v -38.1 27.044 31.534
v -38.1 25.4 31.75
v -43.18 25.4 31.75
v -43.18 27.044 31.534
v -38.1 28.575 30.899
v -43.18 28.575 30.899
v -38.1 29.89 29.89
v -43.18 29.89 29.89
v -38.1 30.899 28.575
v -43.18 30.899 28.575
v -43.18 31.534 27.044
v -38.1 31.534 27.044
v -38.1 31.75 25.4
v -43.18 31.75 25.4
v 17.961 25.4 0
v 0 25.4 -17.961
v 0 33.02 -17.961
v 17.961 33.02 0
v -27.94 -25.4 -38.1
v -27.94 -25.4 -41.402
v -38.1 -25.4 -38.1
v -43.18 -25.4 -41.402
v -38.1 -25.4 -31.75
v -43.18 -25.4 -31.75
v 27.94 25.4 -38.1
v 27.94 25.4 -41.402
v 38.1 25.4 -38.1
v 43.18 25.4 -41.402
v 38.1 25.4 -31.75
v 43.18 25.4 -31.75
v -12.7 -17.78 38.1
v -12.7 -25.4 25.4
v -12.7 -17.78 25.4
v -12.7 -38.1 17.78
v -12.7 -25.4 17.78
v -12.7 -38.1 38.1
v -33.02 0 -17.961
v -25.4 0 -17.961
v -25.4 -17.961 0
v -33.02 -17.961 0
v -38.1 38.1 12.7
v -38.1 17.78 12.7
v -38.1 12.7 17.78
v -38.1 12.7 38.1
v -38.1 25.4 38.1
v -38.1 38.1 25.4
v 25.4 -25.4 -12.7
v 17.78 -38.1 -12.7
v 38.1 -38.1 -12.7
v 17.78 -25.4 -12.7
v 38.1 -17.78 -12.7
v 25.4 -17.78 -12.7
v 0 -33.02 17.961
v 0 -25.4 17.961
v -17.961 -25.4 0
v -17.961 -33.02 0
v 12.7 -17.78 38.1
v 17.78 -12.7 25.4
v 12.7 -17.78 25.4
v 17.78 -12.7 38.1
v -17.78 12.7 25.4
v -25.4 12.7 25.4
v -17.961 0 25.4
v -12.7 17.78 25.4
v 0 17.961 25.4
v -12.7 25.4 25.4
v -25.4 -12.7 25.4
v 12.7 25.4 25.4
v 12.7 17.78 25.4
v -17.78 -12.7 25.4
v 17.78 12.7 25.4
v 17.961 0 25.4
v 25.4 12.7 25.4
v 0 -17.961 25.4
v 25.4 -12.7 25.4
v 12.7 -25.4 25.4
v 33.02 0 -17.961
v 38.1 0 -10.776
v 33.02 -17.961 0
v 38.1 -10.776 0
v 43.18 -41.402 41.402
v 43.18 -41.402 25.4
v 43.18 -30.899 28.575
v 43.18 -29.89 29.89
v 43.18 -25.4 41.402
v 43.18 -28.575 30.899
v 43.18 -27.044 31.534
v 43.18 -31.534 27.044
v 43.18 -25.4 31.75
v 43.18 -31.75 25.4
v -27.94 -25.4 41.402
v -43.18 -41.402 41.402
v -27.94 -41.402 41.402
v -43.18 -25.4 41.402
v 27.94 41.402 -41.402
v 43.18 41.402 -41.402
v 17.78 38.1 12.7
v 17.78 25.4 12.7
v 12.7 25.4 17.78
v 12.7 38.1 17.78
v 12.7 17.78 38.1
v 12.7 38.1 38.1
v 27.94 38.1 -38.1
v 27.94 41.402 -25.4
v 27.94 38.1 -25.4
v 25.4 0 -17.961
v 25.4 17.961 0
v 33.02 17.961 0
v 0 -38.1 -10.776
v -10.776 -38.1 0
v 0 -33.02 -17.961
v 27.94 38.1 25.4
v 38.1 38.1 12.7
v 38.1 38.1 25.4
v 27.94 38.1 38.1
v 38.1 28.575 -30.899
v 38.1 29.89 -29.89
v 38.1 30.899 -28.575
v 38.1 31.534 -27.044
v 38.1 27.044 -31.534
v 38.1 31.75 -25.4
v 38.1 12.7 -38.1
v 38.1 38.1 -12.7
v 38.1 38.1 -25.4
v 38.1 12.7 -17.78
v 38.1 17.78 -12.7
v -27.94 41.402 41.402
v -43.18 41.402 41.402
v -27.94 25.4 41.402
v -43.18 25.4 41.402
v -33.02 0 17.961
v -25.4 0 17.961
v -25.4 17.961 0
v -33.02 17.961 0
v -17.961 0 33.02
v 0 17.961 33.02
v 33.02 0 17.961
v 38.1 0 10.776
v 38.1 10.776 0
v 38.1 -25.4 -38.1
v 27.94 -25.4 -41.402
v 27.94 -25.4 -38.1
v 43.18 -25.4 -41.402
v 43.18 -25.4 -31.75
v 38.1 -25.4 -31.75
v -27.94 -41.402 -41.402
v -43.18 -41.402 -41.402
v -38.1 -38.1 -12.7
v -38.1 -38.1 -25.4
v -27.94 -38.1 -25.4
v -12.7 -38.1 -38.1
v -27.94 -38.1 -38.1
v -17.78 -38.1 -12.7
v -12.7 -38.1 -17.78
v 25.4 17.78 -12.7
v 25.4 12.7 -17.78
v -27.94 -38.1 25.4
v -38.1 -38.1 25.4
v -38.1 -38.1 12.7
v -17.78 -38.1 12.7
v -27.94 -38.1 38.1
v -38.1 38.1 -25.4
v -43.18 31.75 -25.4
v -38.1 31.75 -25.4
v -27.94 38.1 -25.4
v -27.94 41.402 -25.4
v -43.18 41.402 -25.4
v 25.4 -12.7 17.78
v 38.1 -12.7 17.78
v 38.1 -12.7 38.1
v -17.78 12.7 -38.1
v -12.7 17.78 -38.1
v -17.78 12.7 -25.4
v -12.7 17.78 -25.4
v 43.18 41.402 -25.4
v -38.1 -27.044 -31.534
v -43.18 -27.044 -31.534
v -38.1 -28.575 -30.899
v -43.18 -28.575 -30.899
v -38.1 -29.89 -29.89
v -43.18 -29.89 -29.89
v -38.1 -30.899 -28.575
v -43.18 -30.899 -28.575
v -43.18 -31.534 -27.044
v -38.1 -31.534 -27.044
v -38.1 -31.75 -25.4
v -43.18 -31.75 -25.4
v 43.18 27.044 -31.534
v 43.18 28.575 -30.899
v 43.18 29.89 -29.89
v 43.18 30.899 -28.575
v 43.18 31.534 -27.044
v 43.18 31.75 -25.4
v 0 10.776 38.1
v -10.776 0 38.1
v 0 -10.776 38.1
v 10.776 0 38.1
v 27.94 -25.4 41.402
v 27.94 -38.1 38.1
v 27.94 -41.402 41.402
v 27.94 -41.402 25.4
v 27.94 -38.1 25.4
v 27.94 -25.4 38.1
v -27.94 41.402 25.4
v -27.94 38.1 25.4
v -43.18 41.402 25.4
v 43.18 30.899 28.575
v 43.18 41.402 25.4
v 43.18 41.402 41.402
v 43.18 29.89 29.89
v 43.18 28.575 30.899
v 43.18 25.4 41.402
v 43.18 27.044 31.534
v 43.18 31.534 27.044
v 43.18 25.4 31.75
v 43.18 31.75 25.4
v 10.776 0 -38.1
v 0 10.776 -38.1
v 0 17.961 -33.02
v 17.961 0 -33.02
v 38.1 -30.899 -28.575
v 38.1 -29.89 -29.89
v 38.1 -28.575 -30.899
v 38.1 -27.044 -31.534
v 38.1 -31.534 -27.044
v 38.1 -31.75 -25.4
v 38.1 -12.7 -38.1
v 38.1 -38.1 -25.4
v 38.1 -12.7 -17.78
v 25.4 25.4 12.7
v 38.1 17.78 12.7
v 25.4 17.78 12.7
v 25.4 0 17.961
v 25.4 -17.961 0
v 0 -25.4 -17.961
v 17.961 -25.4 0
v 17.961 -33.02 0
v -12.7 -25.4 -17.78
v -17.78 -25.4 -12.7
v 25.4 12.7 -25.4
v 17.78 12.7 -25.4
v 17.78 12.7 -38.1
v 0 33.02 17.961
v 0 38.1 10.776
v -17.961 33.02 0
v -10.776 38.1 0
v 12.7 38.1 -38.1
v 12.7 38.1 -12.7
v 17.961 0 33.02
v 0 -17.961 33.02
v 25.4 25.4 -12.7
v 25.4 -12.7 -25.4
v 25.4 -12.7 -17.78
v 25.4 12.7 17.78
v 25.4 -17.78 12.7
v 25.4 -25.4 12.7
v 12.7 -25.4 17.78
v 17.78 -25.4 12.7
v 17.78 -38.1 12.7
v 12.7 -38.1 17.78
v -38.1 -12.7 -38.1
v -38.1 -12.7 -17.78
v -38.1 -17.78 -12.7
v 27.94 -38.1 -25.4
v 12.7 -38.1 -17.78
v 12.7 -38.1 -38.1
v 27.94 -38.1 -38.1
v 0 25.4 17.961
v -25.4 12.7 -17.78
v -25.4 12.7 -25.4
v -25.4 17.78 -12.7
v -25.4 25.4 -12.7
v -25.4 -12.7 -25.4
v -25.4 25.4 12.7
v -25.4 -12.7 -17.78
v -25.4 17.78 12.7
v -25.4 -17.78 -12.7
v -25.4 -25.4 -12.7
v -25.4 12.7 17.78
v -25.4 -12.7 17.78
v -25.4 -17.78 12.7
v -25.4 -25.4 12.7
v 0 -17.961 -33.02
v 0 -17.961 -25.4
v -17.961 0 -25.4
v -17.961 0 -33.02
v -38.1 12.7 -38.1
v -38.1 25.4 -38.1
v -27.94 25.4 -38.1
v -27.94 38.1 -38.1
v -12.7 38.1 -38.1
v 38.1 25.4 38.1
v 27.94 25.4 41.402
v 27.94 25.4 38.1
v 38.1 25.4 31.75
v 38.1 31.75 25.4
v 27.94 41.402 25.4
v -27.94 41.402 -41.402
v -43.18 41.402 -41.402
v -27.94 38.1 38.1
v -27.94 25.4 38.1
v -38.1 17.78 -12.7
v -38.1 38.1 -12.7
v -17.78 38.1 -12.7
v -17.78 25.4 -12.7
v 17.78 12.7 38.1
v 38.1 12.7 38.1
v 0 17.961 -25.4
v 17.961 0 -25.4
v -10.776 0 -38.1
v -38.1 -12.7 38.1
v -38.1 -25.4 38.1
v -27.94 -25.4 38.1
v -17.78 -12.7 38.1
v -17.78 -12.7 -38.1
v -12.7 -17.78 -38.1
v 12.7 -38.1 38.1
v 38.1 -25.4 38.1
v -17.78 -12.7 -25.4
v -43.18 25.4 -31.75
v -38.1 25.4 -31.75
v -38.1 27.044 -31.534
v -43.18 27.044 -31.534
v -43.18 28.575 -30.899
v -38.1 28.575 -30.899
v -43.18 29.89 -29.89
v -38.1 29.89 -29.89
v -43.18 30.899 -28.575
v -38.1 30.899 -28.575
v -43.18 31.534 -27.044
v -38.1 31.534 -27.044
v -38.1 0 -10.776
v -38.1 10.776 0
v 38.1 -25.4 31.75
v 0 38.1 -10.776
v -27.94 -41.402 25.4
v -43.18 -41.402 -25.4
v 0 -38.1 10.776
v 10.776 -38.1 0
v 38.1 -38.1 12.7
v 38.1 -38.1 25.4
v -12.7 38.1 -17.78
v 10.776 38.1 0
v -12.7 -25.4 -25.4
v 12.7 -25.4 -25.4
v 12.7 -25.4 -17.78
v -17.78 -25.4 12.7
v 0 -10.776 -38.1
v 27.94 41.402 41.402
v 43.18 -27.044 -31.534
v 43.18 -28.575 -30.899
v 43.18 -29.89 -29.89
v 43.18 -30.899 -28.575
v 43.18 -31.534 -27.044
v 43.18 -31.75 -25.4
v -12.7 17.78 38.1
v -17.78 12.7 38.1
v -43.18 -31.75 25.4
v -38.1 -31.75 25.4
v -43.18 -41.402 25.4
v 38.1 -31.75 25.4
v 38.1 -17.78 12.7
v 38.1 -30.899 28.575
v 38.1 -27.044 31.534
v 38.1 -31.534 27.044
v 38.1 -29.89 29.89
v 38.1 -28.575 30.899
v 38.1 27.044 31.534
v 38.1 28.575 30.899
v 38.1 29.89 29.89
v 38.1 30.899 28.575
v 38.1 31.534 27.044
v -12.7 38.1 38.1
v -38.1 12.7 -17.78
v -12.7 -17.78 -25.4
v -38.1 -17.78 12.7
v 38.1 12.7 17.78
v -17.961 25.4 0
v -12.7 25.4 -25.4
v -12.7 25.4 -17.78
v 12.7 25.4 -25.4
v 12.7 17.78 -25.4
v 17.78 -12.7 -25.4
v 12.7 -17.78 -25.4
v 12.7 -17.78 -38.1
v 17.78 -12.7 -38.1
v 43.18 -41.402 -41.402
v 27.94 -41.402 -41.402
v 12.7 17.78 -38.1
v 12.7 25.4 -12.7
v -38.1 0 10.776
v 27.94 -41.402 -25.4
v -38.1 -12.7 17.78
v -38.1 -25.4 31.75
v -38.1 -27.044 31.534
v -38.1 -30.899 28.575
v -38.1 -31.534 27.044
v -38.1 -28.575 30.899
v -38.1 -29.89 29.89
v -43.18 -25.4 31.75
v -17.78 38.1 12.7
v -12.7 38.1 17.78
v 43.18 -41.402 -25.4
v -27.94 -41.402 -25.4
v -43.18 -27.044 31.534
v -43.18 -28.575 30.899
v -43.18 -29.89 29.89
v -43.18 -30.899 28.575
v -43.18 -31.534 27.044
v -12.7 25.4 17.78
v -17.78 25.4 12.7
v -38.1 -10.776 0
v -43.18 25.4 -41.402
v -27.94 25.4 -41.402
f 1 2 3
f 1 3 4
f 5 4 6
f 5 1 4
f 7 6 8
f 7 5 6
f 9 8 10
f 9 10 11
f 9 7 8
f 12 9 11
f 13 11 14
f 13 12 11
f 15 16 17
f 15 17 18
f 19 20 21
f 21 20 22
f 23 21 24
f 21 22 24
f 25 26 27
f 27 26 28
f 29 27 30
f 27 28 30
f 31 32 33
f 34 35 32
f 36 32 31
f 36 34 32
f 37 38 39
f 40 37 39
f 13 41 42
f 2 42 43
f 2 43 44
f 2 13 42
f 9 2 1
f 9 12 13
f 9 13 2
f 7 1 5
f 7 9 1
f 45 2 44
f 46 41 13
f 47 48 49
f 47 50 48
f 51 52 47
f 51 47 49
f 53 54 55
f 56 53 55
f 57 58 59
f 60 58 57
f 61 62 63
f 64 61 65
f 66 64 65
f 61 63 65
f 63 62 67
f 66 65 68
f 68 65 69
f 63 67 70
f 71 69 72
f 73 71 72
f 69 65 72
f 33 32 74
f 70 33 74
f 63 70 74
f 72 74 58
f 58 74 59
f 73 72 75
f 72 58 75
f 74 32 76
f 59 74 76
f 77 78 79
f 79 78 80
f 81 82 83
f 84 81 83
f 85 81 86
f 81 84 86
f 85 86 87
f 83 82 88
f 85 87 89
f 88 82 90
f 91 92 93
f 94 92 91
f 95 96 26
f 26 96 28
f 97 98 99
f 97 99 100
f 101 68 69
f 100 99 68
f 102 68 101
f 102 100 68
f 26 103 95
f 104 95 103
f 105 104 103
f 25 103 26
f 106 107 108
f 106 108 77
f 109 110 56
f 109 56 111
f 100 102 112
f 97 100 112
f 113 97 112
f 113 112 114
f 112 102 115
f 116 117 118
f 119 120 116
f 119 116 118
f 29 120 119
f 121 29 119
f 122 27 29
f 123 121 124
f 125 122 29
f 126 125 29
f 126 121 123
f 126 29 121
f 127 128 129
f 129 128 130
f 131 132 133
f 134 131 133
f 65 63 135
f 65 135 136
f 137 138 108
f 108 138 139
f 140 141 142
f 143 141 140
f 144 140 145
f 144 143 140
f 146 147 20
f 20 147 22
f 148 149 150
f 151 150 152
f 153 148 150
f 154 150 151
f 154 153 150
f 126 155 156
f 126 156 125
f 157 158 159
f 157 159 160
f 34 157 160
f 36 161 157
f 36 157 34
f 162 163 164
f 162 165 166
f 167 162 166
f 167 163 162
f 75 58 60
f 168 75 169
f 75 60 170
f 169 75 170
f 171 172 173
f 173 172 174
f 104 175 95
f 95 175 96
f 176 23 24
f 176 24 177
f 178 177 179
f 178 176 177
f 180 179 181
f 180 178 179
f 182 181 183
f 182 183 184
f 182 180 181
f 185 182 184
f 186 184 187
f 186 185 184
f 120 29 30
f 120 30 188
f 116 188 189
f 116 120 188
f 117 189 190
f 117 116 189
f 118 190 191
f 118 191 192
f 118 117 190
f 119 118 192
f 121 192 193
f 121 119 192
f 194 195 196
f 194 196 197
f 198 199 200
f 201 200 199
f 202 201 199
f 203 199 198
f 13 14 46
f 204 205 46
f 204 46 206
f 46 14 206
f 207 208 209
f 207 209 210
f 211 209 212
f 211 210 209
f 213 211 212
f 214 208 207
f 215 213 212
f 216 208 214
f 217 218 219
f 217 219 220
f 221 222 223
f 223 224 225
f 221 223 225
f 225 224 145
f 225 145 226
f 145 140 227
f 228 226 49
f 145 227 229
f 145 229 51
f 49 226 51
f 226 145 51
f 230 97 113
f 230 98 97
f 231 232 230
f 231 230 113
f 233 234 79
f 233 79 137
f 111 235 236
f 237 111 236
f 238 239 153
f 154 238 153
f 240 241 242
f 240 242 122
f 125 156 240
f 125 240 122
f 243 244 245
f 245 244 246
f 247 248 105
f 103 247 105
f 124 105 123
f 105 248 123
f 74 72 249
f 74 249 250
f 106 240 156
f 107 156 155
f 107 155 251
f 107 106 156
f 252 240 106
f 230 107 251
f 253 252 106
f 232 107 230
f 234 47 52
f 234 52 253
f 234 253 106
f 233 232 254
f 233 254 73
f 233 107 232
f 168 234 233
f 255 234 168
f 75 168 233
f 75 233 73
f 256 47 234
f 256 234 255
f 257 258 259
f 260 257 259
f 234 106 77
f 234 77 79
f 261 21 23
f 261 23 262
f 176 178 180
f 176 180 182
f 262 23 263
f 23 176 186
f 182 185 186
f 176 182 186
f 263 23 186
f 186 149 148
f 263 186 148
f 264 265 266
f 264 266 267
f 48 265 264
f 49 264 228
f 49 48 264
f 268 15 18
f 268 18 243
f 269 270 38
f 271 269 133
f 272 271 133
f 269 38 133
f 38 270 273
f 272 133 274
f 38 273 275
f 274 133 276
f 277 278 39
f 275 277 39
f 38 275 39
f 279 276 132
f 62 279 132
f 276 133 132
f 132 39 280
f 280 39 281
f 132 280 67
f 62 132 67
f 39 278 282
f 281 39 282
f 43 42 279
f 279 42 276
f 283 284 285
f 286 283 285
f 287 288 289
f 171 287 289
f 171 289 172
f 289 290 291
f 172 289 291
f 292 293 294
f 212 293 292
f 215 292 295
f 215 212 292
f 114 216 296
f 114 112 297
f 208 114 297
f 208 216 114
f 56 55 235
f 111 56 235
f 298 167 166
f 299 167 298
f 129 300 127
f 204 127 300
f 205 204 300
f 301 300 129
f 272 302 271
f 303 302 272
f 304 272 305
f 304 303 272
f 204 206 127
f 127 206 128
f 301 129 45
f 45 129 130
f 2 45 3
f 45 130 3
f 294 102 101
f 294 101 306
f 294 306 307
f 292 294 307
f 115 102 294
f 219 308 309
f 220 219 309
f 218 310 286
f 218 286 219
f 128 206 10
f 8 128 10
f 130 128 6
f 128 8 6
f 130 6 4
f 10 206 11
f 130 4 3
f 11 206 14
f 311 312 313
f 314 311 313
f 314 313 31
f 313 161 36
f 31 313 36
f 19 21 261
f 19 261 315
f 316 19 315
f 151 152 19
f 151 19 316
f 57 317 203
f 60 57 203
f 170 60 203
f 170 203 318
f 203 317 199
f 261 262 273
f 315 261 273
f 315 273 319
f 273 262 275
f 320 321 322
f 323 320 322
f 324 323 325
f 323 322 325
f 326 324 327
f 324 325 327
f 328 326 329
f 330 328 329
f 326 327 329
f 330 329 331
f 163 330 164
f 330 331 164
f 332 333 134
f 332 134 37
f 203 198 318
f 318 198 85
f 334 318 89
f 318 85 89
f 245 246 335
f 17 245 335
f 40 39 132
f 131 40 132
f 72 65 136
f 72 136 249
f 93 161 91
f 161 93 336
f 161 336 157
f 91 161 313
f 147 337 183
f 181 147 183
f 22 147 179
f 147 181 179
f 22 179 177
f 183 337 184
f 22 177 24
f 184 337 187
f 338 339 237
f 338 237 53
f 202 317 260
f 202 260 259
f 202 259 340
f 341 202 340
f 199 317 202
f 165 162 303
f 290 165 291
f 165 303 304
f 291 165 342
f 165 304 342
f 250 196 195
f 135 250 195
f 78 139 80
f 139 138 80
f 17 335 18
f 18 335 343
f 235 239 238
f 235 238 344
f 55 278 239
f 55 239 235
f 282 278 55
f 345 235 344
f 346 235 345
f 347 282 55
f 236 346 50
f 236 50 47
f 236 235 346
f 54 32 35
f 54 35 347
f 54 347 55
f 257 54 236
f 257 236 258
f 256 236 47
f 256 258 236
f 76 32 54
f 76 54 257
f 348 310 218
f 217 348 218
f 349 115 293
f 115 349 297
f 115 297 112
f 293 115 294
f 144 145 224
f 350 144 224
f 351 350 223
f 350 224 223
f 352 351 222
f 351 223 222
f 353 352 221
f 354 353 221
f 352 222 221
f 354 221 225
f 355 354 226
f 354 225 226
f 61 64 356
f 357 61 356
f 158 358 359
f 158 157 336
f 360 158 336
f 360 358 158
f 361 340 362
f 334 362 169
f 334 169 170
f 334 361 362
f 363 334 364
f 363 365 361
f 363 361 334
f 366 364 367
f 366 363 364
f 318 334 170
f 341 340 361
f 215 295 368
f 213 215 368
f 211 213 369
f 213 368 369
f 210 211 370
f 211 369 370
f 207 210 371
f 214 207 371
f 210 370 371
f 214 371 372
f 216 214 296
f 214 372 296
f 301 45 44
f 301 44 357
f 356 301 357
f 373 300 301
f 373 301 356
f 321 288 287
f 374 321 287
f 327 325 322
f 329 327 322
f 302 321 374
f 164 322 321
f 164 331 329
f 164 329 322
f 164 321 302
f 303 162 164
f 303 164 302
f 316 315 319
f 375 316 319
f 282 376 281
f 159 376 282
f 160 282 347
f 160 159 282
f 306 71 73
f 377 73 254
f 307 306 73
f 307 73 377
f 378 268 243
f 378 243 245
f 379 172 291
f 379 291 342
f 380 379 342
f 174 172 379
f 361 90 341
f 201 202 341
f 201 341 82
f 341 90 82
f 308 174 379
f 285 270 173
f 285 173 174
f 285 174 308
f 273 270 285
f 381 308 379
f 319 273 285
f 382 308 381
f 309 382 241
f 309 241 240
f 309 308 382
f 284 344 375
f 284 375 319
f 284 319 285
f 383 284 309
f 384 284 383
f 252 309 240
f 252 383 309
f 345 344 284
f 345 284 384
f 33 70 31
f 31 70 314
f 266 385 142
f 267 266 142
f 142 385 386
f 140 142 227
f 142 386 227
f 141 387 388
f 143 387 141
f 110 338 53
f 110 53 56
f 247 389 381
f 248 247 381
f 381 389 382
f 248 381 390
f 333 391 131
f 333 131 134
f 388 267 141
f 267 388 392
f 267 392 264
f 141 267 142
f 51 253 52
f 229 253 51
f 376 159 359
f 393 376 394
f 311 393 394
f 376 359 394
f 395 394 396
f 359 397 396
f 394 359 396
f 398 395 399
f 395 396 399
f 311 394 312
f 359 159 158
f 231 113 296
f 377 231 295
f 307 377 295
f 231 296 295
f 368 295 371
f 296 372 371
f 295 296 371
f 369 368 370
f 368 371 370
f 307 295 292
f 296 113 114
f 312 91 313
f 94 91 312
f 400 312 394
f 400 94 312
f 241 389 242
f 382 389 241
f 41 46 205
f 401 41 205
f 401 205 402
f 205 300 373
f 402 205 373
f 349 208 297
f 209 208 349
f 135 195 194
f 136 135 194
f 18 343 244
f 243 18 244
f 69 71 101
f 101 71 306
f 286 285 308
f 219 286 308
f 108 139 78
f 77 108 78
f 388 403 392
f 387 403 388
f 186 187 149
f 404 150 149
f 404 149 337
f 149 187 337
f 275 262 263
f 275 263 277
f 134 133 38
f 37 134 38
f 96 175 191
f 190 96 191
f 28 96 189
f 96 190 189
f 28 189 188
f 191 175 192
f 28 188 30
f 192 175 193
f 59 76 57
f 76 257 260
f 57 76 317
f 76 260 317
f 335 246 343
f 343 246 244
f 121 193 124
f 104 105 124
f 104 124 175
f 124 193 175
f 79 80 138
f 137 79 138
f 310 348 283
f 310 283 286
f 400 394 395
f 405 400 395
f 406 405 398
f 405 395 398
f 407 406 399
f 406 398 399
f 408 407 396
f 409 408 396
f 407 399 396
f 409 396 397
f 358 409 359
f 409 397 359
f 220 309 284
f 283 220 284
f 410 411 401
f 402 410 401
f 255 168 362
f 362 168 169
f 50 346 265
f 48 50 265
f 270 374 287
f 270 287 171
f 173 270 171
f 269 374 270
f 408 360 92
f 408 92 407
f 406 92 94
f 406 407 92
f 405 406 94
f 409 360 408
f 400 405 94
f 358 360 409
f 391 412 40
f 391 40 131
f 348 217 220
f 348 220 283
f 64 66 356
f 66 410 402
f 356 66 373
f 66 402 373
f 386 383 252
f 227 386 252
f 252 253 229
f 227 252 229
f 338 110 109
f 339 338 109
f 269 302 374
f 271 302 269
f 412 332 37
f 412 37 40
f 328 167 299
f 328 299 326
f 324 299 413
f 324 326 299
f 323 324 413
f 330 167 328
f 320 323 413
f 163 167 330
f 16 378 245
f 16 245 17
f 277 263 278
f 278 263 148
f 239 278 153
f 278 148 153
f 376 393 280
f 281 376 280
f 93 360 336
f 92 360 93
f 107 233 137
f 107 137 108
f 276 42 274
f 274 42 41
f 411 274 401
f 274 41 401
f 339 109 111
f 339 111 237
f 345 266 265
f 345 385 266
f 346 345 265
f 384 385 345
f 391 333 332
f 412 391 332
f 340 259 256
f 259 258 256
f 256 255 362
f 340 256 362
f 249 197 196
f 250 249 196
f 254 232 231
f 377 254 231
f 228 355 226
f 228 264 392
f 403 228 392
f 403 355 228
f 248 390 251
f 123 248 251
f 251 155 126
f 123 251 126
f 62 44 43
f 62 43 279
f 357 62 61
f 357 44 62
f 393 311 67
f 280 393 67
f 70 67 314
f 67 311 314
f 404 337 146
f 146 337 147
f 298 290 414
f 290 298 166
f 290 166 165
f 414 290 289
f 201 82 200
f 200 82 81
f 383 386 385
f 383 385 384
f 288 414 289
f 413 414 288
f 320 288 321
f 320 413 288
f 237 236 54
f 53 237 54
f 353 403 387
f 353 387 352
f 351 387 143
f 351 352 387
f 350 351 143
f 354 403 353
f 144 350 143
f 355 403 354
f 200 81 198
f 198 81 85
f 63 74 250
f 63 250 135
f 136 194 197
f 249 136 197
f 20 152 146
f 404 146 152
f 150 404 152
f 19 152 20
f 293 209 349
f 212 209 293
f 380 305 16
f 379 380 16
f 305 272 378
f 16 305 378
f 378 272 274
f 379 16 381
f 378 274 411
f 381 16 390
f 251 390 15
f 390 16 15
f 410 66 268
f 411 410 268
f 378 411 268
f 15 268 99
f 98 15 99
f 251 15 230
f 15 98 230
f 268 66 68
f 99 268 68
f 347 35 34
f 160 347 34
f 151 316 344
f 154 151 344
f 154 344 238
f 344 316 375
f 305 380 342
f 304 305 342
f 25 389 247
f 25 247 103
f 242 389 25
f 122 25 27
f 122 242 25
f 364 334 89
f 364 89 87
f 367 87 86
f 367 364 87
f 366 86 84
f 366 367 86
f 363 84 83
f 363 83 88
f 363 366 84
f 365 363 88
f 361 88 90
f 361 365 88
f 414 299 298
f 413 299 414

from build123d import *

# Parameters (mm, degrees)
F0_W           = 50.8
F0_H           = 50.8
F1_DEPTH       = 25.4
F1_DEPTH_BACK  = 25.4
F2_W           = 25.4
F2_H           = 25.4
F3_DEPTH       = 12.7
F3_DEPTH_BACK  = 12.7
F6_DEPTH       = 12.7
F6_DEPTH_BACK  = 12.7
F9_DEPTH       = 12.7
F9_DEPTH_BACK  = 12.7
F11_DEPTH      = 5.08
F11_DEPTH_BACK = 10.16
F16_SIZE       = 5.08
F17_SIZE       = 5.08


with BuildPart() as f1:
    # F0 (on Front) → F1 (new body, two sides)
    with BuildSketch(Plane.XZ) as f1_sk:
        Rectangle(F0_W, F0_H)
    extrude(amount=F1_DEPTH)
    extrude(f1_sk.sketch, amount=-F1_DEPTH_BACK)

    # F2 (on face) → F3 (join, two sides)
    with BuildSketch(Plane.XZ.offset(25.4)) as f3_sk:
        with Locations((-25.4, 25.4)):
            Rectangle(F2_W, F2_H)
        with Locations((25.4, 25.4)):
            Rectangle(F2_W, F2_H)
        with Locations((25.4, -25.4)):
            Rectangle(F2_W, F2_H)
        with Locations((-25.4, -25.4)):
            Rectangle(F2_W, F2_H)
        Polygon((17.9605122421, 0), (0, 17.9605122421), (-17.9605122421, 0), (0, -17.9605122421), align=None)
    extrude(amount=F3_DEPTH)
    extrude(f3_sk.sketch, amount=-F3_DEPTH_BACK)

    # F4: F1 across plane


with BuildPart() as f1_1:
    add(f1.part)
    add(f1.part.mirror(Plane.XZ))

    # F5 (on face) → F6 (join, two sides)
    with BuildSketch(Plane(origin=(0, 0, -25.4), x_dir=(1, 0, 0), z_dir=(0, 0, -1))) as f6_sk:
        Polygon((17.9605122421, 0), (0, 17.9605122421), (-17.9605122421, 0), (0, -17.9605122421), align=None)
    extrude(amount=F6_DEPTH)
    extrude(f6_sk.sketch, amount=-F6_DEPTH_BACK)

    # F7: F1 across plane


with BuildPart() as f1_2:
    add(f1_1.part)
    add(f1_1.part.mirror(Plane.XY))

    # F8 (on face) → F9 (join, two sides)
    with BuildSketch(Plane(origin=(-25.4, 0, 0), x_dir=(0, -1, 0), z_dir=(-1, 0, 0))) as f9_sk:
        Polygon((17.9605122421, 0), (0, 17.9605122421), (-17.9605122421, 0), (0, -17.9605122421), align=None)
    extrude(amount=F9_DEPTH)
    extrude(f9_sk.sketch, amount=-F9_DEPTH_BACK)

    # F10 (on face) → F11 (join, two sides)
    with BuildSketch(Plane(origin=(-38.1, 0, 0), x_dir=(0, -1, 0), z_dir=(-1, 0, 0))) as f11_sk:
        Polygon((-38.1, -38.1), (-38.1, -25.4), (-41.402, -25.4), (-41.402, -38.1), (-41.402, -41.402), (-38.1, -41.402), (-25.4, -41.402), (-25.4, -38.1), align=None)
        with BuildLine():
            Line((-31.75, -25.4), (-38.1, -25.4))
            Line((-38.1, -25.4), (-38.1, -38.1))
            Line((-38.1, -38.1), (-25.4, -38.1))
            Line((-25.4, -38.1), (-25.4, -31.75))
            ThreePointArc((-25.4, -31.75), (-29.8901280605, -29.8901280605), (-31.75, -25.4))
        make_face()
    extrude(amount=F11_DEPTH)
    extrude(f11_sk.sketch, amount=-F11_DEPTH_BACK)

    # F12: F1 across plane


with BuildPart() as f1_3:
    add(f1_2.part)
    add(f1_2.part.mirror(Plane.YZ))

    # F13: F1 across plane


with BuildPart() as f1_4:
    add(f1_3.part)
    add(f1_3.part.mirror(Plane.XY))

    # F14: F1 across plane


with BuildPart() as f1_5:
    add(f1_4.part)
    add(f1_4.part.mirror(Plane.XZ))

    # F15: F1 across plane


with BuildPart() as f1_6:
    add(f1_5.part)
    add(f1_5.part.mirror(Plane.YZ), mode=Mode.INTERSECT)

    # F16
    f16_edges = [f1_6.edges().sort_by_distance(p)[0] for p in [
        (12.7, 12.7, -31.75),
        (12.7, -12.7, -31.75),
        (-12.7, -12.7, -31.75),
        (-12.7, 12.7, -31.75),
        (-12.7, 31.75, -12.7),
        (12.7, 31.75, 12.7),
        (-12.7, 31.75, 12.7),
        (31.75, 12.7, 12.7),
        (31.75, -12.7, 12.7),
        (31.75, -12.7, -12.7),
        (31.75, 12.7, -12.7),
        (-12.7, -12.7, 31.75),
        (-12.7, 12.7, 31.75),
        (12.7, -31.75, 12.7),
        (-12.7, -31.75, -12.7),
        (12.7, -31.75, -12.7),
        (12.7, 12.7, 31.75),
        (12.7, -12.7, 31.75),
        (-31.75, 12.7, -12.7),
        (-31.75, 12.7, 12.7),
        (-31.75, -12.7, -12.7),
        (-31.75, -12.7, 12.7),
        (-12.7, -31.75, 12.7),
    ]]
    chamfer(f16_edges, length=F16_SIZE)

    # F17
    f17_edges = [f1_6.edges().sort_by_distance(p)[0] for p in [
        (-38.1, 8.980256, -8.980256),
        (-38.1, -8.980256, -8.980256),
        (-38.1, -8.980256, 8.980256),
        (-38.1, 8.980256, 8.980256),
        (8.980256, -8.980256, -38.1),
        (-8.980256, -8.980256, -38.1),
        (-8.980256, 8.980256, -38.1),
        (8.980256, 8.980256, -38.1),
        (8.980256, 38.1, 8.980256),
        (-8.980256, 38.1, 8.980256),
        (-8.980256, 38.1, -8.980256),
        (8.980256, 38.1, -8.980256),
        (8.980256, -8.980256, 38.1),
        (-8.980256, -8.980256, 38.1),
        (-8.980256, 8.980256, 38.1),
        (8.980256, 8.980256, 38.1),
        (38.1, 8.980256, -8.980256),
        (38.1, -8.980256, -8.980256),
        (38.1, -8.980256, 8.980256),
        (38.1, 8.980256, 8.980256),
        (8.980256, -38.1, 8.980256),
        (-8.980256, -38.1, 8.980256),
        (-8.980256, -38.1, -8.980256),
        (8.980256, -38.1, -8.980256),
    ]]
    chamfer(f17_edges, length=F17_SIZE)


solid = f1_6.part
